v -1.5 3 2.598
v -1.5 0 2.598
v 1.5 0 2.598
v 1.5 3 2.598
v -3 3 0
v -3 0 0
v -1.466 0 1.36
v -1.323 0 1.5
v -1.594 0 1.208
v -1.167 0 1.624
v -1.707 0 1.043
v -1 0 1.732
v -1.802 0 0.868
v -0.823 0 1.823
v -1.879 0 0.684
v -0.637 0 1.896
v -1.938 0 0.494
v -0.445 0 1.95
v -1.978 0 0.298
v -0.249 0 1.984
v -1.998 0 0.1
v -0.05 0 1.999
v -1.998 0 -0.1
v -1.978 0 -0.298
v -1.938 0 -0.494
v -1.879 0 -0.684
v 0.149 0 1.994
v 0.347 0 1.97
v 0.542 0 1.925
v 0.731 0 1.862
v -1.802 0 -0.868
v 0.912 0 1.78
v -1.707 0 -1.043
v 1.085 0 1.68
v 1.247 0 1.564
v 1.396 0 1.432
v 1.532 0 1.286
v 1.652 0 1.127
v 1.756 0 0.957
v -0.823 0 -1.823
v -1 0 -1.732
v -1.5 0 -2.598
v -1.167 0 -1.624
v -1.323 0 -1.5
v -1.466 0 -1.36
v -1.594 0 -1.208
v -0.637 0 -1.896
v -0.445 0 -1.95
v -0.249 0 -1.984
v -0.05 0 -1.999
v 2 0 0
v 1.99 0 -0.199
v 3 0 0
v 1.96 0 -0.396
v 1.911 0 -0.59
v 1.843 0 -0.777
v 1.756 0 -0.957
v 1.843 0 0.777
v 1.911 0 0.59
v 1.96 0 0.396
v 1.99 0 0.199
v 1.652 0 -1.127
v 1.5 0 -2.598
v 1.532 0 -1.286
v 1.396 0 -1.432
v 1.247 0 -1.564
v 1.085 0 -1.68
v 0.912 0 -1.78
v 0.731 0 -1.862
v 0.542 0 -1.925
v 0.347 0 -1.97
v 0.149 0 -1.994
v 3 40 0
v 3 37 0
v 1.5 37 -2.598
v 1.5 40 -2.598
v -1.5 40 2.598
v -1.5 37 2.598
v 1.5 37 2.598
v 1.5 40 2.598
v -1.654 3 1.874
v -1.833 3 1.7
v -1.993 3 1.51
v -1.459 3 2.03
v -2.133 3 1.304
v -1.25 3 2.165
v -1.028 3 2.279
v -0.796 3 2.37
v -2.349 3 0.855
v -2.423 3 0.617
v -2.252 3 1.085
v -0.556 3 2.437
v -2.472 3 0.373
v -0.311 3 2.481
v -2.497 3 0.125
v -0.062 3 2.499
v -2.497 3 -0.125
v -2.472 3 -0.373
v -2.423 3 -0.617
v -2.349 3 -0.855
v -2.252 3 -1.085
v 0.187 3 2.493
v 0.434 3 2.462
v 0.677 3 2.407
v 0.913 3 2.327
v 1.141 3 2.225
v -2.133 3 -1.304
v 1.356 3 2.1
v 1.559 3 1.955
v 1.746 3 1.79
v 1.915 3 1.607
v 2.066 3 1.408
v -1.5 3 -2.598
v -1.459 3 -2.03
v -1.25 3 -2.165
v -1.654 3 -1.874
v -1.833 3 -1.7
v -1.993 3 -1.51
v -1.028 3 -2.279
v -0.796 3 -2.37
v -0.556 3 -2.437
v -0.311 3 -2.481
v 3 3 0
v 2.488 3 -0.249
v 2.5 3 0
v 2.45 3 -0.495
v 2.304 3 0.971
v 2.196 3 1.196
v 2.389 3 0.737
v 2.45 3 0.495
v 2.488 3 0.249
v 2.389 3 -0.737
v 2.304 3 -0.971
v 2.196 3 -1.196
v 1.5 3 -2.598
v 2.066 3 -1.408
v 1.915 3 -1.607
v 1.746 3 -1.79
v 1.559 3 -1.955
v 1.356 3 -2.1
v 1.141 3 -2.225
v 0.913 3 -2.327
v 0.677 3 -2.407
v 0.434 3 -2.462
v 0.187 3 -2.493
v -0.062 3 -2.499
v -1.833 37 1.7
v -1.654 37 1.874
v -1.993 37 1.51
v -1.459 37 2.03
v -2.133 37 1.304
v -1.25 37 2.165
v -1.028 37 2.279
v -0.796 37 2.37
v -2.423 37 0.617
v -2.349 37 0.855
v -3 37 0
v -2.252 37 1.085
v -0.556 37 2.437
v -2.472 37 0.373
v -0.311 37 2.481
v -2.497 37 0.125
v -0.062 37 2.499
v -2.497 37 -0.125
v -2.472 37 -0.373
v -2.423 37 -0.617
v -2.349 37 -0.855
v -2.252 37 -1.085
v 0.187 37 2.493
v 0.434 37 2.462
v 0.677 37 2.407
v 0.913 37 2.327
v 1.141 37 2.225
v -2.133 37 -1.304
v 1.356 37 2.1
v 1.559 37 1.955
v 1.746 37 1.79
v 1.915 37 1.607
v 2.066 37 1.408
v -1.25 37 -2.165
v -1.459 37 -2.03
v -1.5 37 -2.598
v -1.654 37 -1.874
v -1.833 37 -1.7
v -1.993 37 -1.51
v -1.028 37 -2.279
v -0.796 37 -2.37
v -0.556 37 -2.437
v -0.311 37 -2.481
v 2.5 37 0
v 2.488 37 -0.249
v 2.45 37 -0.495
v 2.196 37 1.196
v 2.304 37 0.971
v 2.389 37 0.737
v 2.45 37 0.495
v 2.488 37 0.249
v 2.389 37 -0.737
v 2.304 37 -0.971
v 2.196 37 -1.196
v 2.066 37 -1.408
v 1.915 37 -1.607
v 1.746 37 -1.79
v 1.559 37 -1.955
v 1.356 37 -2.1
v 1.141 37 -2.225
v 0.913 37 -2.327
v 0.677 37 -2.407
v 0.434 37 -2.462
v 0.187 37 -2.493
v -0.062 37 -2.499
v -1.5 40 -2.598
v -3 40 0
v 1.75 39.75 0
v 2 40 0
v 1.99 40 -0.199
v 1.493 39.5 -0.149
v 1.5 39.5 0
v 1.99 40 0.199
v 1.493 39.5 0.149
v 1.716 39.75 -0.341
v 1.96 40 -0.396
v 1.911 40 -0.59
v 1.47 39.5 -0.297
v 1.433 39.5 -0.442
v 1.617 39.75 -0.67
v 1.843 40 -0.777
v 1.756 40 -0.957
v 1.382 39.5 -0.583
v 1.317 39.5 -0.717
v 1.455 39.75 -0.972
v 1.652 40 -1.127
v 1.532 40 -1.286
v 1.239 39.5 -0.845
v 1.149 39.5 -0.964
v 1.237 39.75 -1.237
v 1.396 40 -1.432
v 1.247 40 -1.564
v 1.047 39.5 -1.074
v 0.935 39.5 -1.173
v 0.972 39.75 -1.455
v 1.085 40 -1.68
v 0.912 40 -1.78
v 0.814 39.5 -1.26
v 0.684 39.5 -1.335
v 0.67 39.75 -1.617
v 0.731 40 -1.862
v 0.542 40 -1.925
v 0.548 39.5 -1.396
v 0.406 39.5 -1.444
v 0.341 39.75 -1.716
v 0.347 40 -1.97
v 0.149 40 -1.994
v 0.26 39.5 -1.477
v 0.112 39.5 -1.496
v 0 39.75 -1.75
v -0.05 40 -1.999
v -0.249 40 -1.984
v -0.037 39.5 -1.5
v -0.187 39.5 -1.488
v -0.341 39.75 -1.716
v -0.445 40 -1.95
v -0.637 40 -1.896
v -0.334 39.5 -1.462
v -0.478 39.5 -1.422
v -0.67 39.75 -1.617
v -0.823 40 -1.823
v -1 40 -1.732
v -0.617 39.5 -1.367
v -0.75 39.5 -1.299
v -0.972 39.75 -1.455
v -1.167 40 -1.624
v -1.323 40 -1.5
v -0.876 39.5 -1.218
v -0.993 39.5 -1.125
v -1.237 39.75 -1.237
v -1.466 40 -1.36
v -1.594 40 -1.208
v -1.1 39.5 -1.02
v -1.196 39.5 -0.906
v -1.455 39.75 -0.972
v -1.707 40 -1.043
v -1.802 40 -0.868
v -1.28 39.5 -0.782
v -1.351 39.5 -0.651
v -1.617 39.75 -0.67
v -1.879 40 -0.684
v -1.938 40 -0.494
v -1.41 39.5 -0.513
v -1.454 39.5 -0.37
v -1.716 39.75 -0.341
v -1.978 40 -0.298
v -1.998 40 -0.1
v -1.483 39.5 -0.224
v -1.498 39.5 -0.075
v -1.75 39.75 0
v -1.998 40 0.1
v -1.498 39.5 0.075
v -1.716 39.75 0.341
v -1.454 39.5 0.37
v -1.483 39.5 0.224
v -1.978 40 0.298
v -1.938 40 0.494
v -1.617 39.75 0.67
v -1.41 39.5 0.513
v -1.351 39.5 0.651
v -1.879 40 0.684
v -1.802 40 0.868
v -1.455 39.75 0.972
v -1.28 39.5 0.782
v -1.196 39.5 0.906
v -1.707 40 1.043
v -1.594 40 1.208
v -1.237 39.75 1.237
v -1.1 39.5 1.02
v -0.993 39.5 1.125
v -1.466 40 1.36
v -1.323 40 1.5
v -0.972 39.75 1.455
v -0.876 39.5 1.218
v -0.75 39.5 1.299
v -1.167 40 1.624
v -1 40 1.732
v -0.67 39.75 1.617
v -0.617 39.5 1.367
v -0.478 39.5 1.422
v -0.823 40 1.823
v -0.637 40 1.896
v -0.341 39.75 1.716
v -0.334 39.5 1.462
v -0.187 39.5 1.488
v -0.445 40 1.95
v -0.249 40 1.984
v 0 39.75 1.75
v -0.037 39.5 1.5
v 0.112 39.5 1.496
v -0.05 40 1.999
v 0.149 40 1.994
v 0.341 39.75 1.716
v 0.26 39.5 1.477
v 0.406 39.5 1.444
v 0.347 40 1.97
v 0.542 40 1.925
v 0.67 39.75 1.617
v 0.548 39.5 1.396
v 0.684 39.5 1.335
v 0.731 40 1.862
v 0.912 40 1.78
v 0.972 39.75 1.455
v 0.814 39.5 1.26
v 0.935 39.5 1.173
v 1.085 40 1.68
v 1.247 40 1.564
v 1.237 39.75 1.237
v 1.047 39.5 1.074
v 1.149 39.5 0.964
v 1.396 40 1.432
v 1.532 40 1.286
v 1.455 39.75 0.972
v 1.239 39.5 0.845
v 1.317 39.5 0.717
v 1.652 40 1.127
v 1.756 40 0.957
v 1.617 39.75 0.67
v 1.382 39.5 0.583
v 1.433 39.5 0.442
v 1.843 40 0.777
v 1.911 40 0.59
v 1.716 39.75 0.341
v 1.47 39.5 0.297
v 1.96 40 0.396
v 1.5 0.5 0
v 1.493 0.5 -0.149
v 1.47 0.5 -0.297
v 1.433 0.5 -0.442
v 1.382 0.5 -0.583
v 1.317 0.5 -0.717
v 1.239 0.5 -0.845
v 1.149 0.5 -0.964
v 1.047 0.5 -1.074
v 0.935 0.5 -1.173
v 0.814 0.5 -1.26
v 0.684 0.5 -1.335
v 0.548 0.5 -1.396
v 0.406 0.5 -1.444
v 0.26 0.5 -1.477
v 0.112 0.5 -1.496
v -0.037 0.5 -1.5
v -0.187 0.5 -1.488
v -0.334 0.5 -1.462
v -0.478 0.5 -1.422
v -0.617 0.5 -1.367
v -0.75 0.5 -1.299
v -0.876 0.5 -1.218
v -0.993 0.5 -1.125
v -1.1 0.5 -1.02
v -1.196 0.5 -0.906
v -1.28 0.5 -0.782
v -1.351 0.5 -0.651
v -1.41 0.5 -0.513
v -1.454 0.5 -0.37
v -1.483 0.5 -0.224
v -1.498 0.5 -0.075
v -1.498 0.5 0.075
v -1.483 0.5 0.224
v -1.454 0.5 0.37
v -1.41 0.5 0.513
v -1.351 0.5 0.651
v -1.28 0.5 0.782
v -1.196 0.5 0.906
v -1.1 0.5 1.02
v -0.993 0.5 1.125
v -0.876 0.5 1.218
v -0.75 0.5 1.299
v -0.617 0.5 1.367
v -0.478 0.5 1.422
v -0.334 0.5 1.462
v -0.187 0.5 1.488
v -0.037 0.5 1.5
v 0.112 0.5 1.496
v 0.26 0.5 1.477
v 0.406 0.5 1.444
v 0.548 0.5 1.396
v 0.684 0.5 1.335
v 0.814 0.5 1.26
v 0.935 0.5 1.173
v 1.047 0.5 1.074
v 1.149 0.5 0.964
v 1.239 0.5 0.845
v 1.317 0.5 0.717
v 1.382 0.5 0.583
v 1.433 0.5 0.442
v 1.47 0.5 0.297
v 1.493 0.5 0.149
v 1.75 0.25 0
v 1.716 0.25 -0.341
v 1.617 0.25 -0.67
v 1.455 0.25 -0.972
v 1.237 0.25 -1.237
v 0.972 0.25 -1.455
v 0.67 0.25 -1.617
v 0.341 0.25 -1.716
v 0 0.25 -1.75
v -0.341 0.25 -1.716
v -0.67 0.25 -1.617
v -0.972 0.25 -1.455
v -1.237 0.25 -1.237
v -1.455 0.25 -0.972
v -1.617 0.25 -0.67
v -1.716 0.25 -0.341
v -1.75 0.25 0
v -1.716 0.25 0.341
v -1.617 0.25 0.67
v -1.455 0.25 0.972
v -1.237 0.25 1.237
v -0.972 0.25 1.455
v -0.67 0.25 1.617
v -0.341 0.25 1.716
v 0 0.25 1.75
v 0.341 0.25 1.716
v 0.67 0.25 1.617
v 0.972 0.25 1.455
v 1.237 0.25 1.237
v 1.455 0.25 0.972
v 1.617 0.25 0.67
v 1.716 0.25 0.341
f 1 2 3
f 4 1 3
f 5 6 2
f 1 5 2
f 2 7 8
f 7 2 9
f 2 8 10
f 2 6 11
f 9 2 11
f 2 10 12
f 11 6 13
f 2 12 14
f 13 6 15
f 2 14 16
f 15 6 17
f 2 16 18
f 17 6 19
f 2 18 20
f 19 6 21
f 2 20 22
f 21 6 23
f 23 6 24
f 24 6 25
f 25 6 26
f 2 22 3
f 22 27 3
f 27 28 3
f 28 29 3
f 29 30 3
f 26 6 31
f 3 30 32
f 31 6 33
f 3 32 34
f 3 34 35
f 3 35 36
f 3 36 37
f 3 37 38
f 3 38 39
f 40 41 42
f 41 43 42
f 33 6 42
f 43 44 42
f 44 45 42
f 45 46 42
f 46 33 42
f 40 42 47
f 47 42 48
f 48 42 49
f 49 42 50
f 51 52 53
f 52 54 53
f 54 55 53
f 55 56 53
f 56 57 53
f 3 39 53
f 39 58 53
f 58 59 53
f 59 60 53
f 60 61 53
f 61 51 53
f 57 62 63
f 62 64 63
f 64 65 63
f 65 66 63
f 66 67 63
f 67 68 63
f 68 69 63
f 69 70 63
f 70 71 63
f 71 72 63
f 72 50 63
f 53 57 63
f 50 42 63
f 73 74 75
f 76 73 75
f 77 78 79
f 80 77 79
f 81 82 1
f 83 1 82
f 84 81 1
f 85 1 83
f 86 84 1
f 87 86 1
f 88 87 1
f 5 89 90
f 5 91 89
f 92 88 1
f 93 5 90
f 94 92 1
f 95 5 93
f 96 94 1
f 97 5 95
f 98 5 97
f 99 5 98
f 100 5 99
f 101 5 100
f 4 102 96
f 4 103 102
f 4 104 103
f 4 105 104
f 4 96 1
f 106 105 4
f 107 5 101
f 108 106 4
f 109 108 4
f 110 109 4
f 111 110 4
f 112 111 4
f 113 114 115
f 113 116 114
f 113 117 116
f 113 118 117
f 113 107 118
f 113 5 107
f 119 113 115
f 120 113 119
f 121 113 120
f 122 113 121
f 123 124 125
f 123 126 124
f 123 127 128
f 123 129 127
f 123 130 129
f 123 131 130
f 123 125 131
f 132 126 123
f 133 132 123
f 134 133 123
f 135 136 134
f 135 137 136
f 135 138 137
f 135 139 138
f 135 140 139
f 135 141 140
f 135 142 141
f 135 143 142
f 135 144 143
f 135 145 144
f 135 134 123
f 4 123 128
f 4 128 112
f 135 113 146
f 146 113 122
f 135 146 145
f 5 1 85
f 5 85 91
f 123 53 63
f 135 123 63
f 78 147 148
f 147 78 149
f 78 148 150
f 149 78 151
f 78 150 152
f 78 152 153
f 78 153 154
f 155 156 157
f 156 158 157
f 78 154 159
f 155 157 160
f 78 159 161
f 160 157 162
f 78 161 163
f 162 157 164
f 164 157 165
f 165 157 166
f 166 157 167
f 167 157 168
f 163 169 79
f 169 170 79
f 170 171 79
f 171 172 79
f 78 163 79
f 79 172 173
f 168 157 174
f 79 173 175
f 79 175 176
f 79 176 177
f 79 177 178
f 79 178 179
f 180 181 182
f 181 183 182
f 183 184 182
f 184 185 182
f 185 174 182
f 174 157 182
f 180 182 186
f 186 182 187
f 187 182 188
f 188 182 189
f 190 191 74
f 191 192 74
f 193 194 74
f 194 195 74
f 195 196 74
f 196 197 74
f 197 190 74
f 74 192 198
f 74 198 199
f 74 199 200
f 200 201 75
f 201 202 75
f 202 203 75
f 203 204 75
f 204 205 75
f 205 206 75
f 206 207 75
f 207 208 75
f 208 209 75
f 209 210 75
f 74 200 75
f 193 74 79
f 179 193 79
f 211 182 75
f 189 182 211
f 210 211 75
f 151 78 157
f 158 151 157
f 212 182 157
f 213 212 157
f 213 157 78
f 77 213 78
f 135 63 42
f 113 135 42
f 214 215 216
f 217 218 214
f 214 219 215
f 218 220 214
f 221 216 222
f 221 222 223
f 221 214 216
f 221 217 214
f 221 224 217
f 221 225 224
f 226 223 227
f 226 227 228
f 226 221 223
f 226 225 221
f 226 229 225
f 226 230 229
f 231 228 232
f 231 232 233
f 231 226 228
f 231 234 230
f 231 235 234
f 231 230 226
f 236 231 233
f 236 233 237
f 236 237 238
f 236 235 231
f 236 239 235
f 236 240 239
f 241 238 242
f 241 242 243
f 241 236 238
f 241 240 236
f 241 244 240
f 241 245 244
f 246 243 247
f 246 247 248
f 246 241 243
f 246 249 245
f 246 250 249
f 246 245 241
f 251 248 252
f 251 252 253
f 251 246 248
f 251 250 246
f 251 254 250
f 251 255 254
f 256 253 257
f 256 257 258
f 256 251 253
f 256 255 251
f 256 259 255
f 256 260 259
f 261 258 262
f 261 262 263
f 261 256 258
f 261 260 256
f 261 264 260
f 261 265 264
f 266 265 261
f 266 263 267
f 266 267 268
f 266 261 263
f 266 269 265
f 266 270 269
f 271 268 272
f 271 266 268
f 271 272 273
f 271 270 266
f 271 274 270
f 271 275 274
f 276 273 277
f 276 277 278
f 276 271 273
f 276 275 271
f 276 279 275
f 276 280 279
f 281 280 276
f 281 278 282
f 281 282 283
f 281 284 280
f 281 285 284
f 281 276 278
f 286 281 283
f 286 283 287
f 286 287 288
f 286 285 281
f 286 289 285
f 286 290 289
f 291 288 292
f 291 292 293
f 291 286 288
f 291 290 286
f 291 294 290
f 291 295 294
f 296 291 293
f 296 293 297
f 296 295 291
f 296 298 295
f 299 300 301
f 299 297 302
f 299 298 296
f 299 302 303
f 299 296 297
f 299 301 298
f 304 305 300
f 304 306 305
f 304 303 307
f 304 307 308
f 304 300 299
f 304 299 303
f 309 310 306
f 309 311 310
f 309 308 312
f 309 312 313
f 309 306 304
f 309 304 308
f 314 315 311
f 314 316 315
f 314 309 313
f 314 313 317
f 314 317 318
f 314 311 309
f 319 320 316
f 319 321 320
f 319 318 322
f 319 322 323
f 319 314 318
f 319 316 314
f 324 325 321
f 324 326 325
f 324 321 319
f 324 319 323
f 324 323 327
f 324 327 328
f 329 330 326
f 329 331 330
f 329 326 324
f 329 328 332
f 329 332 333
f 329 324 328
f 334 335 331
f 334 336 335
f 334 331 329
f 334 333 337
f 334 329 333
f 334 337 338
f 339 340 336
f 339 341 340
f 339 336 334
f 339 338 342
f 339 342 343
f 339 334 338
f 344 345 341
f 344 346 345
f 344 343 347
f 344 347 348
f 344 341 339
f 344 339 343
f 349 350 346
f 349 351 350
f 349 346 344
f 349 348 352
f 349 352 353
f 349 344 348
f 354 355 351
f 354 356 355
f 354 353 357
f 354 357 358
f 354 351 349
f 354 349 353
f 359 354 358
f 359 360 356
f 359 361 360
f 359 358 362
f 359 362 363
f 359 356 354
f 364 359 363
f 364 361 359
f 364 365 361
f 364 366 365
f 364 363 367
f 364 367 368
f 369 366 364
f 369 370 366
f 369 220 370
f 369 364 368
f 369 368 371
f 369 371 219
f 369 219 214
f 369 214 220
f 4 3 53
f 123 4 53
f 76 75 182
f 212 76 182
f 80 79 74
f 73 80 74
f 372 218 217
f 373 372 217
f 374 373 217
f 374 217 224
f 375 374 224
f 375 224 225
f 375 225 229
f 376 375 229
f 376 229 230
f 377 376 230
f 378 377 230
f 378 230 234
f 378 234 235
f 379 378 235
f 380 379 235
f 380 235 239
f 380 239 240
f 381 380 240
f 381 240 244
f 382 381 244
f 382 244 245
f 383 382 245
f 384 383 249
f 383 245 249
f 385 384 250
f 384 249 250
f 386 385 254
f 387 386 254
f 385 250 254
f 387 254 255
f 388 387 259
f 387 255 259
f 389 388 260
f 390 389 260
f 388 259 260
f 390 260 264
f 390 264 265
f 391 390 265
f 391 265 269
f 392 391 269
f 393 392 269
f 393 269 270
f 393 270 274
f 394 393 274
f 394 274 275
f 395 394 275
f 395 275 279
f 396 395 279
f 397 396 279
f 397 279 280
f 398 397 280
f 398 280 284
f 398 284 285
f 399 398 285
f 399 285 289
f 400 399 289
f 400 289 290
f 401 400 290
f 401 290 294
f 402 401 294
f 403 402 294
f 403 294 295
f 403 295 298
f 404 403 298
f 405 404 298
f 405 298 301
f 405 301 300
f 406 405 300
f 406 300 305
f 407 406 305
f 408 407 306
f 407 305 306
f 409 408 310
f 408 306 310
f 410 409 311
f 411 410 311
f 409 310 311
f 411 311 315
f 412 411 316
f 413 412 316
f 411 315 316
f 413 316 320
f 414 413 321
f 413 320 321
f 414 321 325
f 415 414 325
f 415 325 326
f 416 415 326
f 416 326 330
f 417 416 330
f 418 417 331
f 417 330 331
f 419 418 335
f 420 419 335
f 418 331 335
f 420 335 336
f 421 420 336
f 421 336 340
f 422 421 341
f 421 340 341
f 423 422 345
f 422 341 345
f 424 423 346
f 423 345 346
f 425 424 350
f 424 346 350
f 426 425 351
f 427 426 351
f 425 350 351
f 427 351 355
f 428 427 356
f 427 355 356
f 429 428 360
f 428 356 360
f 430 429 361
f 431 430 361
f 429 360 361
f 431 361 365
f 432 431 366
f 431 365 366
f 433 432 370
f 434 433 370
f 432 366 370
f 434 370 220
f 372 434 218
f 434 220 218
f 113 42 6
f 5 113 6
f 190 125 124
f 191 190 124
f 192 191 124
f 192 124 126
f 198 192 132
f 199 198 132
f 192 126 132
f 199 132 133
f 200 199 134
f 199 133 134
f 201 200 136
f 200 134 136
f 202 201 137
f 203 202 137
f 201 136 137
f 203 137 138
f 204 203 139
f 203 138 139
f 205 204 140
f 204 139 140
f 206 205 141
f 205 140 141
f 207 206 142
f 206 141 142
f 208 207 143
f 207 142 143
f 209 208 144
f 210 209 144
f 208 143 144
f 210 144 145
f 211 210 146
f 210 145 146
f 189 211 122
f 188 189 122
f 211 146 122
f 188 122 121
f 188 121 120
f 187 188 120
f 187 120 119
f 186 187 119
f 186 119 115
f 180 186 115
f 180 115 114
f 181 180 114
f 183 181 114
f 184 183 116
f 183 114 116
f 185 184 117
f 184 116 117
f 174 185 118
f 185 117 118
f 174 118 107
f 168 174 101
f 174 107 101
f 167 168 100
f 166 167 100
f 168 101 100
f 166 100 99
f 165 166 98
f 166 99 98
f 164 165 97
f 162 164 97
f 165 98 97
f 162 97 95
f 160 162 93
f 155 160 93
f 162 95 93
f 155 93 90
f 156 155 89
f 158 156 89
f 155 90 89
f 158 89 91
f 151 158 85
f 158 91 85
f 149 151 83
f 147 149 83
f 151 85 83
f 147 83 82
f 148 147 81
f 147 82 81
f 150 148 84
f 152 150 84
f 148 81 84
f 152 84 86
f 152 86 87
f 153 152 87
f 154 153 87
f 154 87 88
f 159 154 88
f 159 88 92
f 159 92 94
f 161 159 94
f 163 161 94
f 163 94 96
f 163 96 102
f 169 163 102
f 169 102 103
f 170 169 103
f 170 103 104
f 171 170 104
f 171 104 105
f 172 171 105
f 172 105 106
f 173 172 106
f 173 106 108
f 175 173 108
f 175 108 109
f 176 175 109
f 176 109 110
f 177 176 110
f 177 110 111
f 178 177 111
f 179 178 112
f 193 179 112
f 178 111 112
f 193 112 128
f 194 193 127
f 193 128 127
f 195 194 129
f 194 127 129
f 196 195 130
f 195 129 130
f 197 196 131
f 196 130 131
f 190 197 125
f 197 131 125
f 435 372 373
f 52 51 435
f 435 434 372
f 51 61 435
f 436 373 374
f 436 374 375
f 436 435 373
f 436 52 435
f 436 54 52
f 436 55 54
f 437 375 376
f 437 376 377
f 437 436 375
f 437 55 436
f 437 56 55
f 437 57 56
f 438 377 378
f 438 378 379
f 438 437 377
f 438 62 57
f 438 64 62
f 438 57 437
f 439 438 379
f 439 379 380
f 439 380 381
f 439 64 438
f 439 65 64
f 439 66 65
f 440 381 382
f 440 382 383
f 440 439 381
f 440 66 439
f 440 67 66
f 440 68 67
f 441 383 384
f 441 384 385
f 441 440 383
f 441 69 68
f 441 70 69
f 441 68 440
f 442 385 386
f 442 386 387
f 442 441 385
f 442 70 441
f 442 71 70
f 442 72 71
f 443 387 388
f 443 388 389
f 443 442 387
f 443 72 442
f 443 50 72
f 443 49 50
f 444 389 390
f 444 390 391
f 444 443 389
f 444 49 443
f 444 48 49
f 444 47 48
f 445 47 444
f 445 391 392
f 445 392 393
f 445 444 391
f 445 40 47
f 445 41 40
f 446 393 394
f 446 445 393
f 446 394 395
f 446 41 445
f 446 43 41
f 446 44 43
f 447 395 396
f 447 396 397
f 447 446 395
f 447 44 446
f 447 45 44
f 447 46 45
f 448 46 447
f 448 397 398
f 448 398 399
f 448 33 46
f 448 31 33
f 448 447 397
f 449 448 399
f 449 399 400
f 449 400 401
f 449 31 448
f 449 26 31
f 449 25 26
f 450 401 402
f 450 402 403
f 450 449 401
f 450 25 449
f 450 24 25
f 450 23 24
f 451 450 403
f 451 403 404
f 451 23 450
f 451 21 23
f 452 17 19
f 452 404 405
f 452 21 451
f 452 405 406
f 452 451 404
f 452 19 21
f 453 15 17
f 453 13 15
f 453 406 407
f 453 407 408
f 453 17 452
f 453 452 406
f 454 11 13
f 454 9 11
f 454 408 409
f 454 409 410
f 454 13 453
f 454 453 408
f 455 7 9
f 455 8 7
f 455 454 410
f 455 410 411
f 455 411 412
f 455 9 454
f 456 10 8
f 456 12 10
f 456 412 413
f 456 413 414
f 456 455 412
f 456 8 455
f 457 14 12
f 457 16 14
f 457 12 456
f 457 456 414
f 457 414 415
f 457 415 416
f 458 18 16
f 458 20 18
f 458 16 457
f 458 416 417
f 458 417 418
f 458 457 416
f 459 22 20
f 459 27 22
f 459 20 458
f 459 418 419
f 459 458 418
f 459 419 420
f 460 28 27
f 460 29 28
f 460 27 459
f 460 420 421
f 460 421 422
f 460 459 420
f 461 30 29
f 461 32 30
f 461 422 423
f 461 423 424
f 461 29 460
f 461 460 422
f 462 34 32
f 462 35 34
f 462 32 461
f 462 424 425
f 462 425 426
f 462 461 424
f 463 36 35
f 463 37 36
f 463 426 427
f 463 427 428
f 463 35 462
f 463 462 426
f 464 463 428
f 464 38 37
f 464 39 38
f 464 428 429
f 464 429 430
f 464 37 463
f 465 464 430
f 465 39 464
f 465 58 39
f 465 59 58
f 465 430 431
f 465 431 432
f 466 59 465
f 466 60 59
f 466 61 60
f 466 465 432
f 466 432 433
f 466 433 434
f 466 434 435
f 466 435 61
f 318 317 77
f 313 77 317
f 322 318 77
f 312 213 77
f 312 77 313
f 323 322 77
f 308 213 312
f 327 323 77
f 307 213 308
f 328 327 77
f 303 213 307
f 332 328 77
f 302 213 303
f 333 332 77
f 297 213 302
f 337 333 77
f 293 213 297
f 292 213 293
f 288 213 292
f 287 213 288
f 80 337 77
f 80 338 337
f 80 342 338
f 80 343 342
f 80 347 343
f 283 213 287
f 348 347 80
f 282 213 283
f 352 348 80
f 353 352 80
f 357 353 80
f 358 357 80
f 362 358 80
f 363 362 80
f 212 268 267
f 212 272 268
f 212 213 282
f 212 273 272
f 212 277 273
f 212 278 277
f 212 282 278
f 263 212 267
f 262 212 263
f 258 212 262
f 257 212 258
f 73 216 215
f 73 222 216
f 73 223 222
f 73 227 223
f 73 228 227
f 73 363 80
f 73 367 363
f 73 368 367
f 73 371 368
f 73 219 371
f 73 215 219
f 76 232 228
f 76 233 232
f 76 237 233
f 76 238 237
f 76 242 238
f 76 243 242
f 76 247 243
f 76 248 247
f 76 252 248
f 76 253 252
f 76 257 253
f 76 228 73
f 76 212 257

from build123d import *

# Parameters (mm, degrees)
BOSS_EXTRUDE1_DEPTH = 3
SKETCH2_R           = 2.5
BOSS_EXTRUDE2_DEPTH = 34
BOSS_EXTRUDE3_DEPTH = 3
SKETCH4_R           = 1.5
CUT_EXTRUDE1_DEPTH  = 41
CHAMFER1_SIZE       = 0.5


with BuildPart() as part:
    # Sketch1 → Boss-Extrude1 (new body)
    with BuildSketch(Plane(origin=(0, 0, 0), x_dir=(1, 0, 0), z_dir=(0, 1, 0))):
        Polygon((1.5, -2.598076211), (3, 0), (1.5, 2.598076211), (-1.5, 2.598076211), (-3, 0), (-1.5, -2.598076211), align=None)
    extrude(amount=BOSS_EXTRUDE1_DEPTH)

    # Sketch2 → Boss-Extrude2 (add)
    with BuildSketch(Plane(origin=(0, 3, 0), x_dir=(1, 0, 0), z_dir=(0, 1, 0))):
        Circle(SKETCH2_R)
    extrude(amount=BOSS_EXTRUDE2_DEPTH)

    # Sketch3 → Boss-Extrude3 (add)
    with BuildSketch(Plane(origin=(0, 37, 0), x_dir=(1, 0, 0), z_dir=(0, 1, 0))):
        Polygon((1.5, -2.598076211), (3, 0), (1.5, 2.598076211), (-1.5, 2.598076211), (-3, 0), (-1.5, -2.598076211), align=None)
    extrude(amount=BOSS_EXTRUDE3_DEPTH)

    # Sketch4 → Cut-Extrude1 (cut, through all)
    with BuildSketch(Plane(origin=(0, 40, 0), x_dir=(1, 0, 0), z_dir=(0, 1, 0))):
        Circle(SKETCH4_R)
    extrude(amount=-CUT_EXTRUDE1_DEPTH, mode=Mode.SUBTRACT)

    # Chamfer1
    chamfer1_edges = [part.edges().sort_by_distance(p)[0] for p in [
        (-1.5, 0, 0),
        (-1.5, 40, 0),
    ]]
    chamfer(chamfer1_edges, length=CHAMFER1_SIZE)


solid = part.part
